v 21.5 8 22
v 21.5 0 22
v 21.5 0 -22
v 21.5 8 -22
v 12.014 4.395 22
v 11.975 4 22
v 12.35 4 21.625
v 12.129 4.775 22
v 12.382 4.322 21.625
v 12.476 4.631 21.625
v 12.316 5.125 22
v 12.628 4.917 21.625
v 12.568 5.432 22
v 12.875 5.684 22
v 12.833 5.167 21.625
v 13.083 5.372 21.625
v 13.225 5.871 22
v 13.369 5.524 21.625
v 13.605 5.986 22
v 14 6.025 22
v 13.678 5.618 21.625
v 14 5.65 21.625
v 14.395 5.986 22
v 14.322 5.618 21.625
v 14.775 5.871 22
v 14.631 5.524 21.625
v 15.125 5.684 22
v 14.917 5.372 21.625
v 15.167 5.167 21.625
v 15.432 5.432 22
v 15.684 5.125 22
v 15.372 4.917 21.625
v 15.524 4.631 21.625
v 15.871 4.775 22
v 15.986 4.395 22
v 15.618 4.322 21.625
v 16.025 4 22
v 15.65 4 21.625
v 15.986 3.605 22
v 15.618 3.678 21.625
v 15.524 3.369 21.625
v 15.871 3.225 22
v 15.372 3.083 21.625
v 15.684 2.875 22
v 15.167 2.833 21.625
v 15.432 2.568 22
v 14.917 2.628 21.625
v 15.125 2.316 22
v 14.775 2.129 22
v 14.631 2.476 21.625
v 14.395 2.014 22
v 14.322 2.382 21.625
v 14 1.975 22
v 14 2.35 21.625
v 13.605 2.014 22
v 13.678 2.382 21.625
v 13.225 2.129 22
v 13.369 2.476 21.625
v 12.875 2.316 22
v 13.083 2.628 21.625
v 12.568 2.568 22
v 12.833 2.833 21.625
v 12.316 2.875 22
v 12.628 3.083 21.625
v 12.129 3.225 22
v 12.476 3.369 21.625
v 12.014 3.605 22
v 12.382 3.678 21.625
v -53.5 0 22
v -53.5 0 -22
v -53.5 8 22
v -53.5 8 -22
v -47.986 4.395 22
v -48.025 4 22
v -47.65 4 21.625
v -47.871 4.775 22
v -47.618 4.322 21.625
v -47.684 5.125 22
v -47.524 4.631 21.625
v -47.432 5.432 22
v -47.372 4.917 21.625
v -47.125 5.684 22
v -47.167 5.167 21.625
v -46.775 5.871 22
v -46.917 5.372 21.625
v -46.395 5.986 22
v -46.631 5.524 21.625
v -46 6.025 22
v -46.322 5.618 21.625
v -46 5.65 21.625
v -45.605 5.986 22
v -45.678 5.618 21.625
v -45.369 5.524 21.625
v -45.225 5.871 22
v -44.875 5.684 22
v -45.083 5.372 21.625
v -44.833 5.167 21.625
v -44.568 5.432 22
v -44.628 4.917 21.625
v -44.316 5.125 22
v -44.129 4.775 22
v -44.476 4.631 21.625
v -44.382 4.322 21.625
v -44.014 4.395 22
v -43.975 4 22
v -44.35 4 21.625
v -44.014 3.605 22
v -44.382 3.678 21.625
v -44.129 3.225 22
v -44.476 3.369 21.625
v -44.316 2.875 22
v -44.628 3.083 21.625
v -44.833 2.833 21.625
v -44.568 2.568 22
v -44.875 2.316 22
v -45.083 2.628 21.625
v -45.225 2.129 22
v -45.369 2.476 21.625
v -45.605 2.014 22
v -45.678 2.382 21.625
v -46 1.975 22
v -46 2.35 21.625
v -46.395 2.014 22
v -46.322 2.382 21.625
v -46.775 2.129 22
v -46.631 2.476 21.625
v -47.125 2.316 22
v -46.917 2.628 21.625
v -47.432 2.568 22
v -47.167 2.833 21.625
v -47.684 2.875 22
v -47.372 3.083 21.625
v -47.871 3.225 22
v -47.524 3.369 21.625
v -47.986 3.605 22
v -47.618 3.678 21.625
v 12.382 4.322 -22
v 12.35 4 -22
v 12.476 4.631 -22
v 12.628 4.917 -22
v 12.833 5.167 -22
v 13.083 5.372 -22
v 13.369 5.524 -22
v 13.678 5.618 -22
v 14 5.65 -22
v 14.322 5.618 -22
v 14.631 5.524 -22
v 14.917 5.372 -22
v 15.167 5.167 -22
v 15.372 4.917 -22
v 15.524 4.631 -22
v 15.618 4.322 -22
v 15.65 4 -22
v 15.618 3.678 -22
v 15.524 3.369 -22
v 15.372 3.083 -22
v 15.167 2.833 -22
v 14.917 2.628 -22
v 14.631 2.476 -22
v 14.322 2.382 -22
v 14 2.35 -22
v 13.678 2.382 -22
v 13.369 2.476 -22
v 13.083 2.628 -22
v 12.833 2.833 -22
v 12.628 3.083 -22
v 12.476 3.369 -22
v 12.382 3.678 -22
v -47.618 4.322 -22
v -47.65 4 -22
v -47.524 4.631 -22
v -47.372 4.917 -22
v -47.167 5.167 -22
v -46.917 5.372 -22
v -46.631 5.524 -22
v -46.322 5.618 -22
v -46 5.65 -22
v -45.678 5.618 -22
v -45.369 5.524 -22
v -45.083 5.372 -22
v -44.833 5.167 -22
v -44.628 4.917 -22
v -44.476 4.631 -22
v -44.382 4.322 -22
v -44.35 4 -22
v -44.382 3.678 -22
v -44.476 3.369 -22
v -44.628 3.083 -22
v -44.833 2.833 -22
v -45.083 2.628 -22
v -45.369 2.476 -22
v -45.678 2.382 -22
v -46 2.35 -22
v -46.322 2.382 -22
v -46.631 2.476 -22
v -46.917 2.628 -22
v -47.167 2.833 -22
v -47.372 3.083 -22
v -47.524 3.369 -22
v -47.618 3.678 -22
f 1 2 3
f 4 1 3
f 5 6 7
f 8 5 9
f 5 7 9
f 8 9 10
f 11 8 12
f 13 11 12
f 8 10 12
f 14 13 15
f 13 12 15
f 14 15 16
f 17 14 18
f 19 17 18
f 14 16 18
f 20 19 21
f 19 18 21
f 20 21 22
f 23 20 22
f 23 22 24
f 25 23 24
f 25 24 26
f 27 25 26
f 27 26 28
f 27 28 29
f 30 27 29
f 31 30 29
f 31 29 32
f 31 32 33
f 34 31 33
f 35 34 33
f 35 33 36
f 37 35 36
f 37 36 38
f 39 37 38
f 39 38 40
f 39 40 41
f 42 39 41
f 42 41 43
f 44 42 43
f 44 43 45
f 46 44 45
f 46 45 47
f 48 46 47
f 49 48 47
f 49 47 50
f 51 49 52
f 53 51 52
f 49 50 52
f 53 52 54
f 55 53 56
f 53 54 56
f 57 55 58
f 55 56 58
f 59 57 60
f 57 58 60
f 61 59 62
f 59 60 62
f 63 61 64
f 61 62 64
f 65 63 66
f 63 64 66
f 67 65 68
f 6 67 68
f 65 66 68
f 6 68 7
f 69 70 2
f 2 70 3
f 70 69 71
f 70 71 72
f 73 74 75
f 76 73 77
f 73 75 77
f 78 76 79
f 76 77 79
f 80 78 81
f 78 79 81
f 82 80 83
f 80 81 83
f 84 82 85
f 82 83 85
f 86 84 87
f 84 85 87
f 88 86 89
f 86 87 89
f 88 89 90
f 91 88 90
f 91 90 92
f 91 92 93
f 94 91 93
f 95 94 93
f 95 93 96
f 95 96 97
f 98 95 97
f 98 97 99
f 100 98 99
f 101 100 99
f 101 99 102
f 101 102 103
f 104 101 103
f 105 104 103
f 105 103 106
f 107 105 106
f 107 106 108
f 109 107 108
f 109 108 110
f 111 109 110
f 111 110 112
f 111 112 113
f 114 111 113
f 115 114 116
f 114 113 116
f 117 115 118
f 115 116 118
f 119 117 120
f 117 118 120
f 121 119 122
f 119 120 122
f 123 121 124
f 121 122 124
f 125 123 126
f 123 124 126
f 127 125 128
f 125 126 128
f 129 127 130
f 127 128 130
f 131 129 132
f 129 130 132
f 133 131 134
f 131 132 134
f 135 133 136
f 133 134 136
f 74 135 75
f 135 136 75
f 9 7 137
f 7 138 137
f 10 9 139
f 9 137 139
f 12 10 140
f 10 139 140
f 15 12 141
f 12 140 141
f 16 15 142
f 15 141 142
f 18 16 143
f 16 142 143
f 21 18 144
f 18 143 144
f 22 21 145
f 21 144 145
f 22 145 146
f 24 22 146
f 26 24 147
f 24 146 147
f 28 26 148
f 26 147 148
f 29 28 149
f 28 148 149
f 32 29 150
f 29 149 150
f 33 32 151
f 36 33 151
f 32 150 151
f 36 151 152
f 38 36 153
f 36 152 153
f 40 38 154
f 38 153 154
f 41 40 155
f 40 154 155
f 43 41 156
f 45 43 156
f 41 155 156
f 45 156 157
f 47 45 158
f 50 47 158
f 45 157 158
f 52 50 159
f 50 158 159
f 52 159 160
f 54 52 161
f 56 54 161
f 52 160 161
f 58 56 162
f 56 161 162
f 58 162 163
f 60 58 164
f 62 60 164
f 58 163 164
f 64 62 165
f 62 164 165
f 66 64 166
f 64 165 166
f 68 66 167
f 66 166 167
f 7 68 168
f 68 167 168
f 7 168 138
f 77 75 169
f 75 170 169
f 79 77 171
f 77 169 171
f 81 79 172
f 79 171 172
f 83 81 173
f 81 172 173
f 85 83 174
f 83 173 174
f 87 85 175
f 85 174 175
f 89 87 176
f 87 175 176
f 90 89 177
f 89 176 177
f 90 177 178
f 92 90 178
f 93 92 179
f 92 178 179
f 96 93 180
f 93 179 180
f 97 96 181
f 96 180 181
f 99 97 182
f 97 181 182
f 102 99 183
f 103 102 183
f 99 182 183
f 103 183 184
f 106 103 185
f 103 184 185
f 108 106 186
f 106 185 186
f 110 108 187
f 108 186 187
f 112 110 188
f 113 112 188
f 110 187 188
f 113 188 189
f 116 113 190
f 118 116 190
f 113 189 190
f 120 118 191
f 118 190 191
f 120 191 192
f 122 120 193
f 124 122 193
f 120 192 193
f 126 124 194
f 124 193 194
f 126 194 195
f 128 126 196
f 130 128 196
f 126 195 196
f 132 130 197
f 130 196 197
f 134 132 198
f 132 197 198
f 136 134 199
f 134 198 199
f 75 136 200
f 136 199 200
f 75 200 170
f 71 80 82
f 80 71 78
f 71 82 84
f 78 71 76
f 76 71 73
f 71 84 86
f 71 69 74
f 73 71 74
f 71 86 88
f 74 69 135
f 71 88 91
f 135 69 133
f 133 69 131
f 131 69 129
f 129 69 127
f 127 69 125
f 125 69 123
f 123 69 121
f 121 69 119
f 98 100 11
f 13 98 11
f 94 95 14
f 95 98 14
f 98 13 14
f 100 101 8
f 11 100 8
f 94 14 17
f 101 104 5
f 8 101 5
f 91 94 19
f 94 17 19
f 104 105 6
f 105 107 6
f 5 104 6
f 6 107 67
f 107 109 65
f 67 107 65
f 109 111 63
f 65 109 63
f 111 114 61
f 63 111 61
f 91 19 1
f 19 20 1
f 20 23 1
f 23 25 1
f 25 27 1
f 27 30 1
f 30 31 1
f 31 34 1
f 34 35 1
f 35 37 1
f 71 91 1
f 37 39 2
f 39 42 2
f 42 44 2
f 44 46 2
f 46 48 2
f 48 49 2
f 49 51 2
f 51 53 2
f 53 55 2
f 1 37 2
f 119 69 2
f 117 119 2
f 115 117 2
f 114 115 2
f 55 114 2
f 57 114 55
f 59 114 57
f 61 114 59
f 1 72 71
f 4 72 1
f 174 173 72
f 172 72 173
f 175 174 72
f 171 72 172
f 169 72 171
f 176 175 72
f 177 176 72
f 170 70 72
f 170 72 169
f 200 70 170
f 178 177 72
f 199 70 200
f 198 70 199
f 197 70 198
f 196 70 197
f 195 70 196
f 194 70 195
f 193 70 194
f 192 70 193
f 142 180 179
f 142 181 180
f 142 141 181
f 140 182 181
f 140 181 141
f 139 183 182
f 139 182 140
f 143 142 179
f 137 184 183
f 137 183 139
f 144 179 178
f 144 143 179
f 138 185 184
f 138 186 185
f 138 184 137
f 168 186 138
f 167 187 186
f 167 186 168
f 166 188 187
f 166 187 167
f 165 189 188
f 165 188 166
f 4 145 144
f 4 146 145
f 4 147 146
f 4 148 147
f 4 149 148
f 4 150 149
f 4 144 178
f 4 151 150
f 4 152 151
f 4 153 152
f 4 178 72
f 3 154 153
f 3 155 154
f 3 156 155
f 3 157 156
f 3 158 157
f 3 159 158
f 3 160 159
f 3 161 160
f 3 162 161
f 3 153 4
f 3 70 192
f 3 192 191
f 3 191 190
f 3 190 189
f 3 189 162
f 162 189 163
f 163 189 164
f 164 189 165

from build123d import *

# Parameters (mm, degrees)
SKETCH1_W                       = 75
SKETCH1_H                       = 44
BOSS_EXTRUDE2_DEPTH             = 8
M4X0_7_TAPPED_HOLE2_D           = 3.3
M4X0_7_TAPPED_HOLE2_CSINK_D     = 4.05
M4X0_7_TAPPED_HOLE2_CSINK_ANGLE = 90


with BuildPart() as part:
    # Sketch1 → Boss-Extrude2 (new body)
    with BuildSketch(Plane(origin=(0, 0, 0), x_dir=(1, 0, 0), z_dir=(0, 1, 0))):
        with Locations((-16, 0)):
            Rectangle(SKETCH1_W, SKETCH1_H)
    extrude(amount=BOSS_EXTRUDE2_DEPTH)

    # M4x0.7 Tapped Hole2 (through all)
    with Locations(Plane.XY.offset(22)):
        with Locations((-46, 4), (14, 4)):
            CounterSinkHole(M4X0_7_TAPPED_HOLE2_D / 2, M4X0_7_TAPPED_HOLE2_CSINK_D / 2, counter_sink_angle=M4X0_7_TAPPED_HOLE2_CSINK_ANGLE)


solid = part.part
